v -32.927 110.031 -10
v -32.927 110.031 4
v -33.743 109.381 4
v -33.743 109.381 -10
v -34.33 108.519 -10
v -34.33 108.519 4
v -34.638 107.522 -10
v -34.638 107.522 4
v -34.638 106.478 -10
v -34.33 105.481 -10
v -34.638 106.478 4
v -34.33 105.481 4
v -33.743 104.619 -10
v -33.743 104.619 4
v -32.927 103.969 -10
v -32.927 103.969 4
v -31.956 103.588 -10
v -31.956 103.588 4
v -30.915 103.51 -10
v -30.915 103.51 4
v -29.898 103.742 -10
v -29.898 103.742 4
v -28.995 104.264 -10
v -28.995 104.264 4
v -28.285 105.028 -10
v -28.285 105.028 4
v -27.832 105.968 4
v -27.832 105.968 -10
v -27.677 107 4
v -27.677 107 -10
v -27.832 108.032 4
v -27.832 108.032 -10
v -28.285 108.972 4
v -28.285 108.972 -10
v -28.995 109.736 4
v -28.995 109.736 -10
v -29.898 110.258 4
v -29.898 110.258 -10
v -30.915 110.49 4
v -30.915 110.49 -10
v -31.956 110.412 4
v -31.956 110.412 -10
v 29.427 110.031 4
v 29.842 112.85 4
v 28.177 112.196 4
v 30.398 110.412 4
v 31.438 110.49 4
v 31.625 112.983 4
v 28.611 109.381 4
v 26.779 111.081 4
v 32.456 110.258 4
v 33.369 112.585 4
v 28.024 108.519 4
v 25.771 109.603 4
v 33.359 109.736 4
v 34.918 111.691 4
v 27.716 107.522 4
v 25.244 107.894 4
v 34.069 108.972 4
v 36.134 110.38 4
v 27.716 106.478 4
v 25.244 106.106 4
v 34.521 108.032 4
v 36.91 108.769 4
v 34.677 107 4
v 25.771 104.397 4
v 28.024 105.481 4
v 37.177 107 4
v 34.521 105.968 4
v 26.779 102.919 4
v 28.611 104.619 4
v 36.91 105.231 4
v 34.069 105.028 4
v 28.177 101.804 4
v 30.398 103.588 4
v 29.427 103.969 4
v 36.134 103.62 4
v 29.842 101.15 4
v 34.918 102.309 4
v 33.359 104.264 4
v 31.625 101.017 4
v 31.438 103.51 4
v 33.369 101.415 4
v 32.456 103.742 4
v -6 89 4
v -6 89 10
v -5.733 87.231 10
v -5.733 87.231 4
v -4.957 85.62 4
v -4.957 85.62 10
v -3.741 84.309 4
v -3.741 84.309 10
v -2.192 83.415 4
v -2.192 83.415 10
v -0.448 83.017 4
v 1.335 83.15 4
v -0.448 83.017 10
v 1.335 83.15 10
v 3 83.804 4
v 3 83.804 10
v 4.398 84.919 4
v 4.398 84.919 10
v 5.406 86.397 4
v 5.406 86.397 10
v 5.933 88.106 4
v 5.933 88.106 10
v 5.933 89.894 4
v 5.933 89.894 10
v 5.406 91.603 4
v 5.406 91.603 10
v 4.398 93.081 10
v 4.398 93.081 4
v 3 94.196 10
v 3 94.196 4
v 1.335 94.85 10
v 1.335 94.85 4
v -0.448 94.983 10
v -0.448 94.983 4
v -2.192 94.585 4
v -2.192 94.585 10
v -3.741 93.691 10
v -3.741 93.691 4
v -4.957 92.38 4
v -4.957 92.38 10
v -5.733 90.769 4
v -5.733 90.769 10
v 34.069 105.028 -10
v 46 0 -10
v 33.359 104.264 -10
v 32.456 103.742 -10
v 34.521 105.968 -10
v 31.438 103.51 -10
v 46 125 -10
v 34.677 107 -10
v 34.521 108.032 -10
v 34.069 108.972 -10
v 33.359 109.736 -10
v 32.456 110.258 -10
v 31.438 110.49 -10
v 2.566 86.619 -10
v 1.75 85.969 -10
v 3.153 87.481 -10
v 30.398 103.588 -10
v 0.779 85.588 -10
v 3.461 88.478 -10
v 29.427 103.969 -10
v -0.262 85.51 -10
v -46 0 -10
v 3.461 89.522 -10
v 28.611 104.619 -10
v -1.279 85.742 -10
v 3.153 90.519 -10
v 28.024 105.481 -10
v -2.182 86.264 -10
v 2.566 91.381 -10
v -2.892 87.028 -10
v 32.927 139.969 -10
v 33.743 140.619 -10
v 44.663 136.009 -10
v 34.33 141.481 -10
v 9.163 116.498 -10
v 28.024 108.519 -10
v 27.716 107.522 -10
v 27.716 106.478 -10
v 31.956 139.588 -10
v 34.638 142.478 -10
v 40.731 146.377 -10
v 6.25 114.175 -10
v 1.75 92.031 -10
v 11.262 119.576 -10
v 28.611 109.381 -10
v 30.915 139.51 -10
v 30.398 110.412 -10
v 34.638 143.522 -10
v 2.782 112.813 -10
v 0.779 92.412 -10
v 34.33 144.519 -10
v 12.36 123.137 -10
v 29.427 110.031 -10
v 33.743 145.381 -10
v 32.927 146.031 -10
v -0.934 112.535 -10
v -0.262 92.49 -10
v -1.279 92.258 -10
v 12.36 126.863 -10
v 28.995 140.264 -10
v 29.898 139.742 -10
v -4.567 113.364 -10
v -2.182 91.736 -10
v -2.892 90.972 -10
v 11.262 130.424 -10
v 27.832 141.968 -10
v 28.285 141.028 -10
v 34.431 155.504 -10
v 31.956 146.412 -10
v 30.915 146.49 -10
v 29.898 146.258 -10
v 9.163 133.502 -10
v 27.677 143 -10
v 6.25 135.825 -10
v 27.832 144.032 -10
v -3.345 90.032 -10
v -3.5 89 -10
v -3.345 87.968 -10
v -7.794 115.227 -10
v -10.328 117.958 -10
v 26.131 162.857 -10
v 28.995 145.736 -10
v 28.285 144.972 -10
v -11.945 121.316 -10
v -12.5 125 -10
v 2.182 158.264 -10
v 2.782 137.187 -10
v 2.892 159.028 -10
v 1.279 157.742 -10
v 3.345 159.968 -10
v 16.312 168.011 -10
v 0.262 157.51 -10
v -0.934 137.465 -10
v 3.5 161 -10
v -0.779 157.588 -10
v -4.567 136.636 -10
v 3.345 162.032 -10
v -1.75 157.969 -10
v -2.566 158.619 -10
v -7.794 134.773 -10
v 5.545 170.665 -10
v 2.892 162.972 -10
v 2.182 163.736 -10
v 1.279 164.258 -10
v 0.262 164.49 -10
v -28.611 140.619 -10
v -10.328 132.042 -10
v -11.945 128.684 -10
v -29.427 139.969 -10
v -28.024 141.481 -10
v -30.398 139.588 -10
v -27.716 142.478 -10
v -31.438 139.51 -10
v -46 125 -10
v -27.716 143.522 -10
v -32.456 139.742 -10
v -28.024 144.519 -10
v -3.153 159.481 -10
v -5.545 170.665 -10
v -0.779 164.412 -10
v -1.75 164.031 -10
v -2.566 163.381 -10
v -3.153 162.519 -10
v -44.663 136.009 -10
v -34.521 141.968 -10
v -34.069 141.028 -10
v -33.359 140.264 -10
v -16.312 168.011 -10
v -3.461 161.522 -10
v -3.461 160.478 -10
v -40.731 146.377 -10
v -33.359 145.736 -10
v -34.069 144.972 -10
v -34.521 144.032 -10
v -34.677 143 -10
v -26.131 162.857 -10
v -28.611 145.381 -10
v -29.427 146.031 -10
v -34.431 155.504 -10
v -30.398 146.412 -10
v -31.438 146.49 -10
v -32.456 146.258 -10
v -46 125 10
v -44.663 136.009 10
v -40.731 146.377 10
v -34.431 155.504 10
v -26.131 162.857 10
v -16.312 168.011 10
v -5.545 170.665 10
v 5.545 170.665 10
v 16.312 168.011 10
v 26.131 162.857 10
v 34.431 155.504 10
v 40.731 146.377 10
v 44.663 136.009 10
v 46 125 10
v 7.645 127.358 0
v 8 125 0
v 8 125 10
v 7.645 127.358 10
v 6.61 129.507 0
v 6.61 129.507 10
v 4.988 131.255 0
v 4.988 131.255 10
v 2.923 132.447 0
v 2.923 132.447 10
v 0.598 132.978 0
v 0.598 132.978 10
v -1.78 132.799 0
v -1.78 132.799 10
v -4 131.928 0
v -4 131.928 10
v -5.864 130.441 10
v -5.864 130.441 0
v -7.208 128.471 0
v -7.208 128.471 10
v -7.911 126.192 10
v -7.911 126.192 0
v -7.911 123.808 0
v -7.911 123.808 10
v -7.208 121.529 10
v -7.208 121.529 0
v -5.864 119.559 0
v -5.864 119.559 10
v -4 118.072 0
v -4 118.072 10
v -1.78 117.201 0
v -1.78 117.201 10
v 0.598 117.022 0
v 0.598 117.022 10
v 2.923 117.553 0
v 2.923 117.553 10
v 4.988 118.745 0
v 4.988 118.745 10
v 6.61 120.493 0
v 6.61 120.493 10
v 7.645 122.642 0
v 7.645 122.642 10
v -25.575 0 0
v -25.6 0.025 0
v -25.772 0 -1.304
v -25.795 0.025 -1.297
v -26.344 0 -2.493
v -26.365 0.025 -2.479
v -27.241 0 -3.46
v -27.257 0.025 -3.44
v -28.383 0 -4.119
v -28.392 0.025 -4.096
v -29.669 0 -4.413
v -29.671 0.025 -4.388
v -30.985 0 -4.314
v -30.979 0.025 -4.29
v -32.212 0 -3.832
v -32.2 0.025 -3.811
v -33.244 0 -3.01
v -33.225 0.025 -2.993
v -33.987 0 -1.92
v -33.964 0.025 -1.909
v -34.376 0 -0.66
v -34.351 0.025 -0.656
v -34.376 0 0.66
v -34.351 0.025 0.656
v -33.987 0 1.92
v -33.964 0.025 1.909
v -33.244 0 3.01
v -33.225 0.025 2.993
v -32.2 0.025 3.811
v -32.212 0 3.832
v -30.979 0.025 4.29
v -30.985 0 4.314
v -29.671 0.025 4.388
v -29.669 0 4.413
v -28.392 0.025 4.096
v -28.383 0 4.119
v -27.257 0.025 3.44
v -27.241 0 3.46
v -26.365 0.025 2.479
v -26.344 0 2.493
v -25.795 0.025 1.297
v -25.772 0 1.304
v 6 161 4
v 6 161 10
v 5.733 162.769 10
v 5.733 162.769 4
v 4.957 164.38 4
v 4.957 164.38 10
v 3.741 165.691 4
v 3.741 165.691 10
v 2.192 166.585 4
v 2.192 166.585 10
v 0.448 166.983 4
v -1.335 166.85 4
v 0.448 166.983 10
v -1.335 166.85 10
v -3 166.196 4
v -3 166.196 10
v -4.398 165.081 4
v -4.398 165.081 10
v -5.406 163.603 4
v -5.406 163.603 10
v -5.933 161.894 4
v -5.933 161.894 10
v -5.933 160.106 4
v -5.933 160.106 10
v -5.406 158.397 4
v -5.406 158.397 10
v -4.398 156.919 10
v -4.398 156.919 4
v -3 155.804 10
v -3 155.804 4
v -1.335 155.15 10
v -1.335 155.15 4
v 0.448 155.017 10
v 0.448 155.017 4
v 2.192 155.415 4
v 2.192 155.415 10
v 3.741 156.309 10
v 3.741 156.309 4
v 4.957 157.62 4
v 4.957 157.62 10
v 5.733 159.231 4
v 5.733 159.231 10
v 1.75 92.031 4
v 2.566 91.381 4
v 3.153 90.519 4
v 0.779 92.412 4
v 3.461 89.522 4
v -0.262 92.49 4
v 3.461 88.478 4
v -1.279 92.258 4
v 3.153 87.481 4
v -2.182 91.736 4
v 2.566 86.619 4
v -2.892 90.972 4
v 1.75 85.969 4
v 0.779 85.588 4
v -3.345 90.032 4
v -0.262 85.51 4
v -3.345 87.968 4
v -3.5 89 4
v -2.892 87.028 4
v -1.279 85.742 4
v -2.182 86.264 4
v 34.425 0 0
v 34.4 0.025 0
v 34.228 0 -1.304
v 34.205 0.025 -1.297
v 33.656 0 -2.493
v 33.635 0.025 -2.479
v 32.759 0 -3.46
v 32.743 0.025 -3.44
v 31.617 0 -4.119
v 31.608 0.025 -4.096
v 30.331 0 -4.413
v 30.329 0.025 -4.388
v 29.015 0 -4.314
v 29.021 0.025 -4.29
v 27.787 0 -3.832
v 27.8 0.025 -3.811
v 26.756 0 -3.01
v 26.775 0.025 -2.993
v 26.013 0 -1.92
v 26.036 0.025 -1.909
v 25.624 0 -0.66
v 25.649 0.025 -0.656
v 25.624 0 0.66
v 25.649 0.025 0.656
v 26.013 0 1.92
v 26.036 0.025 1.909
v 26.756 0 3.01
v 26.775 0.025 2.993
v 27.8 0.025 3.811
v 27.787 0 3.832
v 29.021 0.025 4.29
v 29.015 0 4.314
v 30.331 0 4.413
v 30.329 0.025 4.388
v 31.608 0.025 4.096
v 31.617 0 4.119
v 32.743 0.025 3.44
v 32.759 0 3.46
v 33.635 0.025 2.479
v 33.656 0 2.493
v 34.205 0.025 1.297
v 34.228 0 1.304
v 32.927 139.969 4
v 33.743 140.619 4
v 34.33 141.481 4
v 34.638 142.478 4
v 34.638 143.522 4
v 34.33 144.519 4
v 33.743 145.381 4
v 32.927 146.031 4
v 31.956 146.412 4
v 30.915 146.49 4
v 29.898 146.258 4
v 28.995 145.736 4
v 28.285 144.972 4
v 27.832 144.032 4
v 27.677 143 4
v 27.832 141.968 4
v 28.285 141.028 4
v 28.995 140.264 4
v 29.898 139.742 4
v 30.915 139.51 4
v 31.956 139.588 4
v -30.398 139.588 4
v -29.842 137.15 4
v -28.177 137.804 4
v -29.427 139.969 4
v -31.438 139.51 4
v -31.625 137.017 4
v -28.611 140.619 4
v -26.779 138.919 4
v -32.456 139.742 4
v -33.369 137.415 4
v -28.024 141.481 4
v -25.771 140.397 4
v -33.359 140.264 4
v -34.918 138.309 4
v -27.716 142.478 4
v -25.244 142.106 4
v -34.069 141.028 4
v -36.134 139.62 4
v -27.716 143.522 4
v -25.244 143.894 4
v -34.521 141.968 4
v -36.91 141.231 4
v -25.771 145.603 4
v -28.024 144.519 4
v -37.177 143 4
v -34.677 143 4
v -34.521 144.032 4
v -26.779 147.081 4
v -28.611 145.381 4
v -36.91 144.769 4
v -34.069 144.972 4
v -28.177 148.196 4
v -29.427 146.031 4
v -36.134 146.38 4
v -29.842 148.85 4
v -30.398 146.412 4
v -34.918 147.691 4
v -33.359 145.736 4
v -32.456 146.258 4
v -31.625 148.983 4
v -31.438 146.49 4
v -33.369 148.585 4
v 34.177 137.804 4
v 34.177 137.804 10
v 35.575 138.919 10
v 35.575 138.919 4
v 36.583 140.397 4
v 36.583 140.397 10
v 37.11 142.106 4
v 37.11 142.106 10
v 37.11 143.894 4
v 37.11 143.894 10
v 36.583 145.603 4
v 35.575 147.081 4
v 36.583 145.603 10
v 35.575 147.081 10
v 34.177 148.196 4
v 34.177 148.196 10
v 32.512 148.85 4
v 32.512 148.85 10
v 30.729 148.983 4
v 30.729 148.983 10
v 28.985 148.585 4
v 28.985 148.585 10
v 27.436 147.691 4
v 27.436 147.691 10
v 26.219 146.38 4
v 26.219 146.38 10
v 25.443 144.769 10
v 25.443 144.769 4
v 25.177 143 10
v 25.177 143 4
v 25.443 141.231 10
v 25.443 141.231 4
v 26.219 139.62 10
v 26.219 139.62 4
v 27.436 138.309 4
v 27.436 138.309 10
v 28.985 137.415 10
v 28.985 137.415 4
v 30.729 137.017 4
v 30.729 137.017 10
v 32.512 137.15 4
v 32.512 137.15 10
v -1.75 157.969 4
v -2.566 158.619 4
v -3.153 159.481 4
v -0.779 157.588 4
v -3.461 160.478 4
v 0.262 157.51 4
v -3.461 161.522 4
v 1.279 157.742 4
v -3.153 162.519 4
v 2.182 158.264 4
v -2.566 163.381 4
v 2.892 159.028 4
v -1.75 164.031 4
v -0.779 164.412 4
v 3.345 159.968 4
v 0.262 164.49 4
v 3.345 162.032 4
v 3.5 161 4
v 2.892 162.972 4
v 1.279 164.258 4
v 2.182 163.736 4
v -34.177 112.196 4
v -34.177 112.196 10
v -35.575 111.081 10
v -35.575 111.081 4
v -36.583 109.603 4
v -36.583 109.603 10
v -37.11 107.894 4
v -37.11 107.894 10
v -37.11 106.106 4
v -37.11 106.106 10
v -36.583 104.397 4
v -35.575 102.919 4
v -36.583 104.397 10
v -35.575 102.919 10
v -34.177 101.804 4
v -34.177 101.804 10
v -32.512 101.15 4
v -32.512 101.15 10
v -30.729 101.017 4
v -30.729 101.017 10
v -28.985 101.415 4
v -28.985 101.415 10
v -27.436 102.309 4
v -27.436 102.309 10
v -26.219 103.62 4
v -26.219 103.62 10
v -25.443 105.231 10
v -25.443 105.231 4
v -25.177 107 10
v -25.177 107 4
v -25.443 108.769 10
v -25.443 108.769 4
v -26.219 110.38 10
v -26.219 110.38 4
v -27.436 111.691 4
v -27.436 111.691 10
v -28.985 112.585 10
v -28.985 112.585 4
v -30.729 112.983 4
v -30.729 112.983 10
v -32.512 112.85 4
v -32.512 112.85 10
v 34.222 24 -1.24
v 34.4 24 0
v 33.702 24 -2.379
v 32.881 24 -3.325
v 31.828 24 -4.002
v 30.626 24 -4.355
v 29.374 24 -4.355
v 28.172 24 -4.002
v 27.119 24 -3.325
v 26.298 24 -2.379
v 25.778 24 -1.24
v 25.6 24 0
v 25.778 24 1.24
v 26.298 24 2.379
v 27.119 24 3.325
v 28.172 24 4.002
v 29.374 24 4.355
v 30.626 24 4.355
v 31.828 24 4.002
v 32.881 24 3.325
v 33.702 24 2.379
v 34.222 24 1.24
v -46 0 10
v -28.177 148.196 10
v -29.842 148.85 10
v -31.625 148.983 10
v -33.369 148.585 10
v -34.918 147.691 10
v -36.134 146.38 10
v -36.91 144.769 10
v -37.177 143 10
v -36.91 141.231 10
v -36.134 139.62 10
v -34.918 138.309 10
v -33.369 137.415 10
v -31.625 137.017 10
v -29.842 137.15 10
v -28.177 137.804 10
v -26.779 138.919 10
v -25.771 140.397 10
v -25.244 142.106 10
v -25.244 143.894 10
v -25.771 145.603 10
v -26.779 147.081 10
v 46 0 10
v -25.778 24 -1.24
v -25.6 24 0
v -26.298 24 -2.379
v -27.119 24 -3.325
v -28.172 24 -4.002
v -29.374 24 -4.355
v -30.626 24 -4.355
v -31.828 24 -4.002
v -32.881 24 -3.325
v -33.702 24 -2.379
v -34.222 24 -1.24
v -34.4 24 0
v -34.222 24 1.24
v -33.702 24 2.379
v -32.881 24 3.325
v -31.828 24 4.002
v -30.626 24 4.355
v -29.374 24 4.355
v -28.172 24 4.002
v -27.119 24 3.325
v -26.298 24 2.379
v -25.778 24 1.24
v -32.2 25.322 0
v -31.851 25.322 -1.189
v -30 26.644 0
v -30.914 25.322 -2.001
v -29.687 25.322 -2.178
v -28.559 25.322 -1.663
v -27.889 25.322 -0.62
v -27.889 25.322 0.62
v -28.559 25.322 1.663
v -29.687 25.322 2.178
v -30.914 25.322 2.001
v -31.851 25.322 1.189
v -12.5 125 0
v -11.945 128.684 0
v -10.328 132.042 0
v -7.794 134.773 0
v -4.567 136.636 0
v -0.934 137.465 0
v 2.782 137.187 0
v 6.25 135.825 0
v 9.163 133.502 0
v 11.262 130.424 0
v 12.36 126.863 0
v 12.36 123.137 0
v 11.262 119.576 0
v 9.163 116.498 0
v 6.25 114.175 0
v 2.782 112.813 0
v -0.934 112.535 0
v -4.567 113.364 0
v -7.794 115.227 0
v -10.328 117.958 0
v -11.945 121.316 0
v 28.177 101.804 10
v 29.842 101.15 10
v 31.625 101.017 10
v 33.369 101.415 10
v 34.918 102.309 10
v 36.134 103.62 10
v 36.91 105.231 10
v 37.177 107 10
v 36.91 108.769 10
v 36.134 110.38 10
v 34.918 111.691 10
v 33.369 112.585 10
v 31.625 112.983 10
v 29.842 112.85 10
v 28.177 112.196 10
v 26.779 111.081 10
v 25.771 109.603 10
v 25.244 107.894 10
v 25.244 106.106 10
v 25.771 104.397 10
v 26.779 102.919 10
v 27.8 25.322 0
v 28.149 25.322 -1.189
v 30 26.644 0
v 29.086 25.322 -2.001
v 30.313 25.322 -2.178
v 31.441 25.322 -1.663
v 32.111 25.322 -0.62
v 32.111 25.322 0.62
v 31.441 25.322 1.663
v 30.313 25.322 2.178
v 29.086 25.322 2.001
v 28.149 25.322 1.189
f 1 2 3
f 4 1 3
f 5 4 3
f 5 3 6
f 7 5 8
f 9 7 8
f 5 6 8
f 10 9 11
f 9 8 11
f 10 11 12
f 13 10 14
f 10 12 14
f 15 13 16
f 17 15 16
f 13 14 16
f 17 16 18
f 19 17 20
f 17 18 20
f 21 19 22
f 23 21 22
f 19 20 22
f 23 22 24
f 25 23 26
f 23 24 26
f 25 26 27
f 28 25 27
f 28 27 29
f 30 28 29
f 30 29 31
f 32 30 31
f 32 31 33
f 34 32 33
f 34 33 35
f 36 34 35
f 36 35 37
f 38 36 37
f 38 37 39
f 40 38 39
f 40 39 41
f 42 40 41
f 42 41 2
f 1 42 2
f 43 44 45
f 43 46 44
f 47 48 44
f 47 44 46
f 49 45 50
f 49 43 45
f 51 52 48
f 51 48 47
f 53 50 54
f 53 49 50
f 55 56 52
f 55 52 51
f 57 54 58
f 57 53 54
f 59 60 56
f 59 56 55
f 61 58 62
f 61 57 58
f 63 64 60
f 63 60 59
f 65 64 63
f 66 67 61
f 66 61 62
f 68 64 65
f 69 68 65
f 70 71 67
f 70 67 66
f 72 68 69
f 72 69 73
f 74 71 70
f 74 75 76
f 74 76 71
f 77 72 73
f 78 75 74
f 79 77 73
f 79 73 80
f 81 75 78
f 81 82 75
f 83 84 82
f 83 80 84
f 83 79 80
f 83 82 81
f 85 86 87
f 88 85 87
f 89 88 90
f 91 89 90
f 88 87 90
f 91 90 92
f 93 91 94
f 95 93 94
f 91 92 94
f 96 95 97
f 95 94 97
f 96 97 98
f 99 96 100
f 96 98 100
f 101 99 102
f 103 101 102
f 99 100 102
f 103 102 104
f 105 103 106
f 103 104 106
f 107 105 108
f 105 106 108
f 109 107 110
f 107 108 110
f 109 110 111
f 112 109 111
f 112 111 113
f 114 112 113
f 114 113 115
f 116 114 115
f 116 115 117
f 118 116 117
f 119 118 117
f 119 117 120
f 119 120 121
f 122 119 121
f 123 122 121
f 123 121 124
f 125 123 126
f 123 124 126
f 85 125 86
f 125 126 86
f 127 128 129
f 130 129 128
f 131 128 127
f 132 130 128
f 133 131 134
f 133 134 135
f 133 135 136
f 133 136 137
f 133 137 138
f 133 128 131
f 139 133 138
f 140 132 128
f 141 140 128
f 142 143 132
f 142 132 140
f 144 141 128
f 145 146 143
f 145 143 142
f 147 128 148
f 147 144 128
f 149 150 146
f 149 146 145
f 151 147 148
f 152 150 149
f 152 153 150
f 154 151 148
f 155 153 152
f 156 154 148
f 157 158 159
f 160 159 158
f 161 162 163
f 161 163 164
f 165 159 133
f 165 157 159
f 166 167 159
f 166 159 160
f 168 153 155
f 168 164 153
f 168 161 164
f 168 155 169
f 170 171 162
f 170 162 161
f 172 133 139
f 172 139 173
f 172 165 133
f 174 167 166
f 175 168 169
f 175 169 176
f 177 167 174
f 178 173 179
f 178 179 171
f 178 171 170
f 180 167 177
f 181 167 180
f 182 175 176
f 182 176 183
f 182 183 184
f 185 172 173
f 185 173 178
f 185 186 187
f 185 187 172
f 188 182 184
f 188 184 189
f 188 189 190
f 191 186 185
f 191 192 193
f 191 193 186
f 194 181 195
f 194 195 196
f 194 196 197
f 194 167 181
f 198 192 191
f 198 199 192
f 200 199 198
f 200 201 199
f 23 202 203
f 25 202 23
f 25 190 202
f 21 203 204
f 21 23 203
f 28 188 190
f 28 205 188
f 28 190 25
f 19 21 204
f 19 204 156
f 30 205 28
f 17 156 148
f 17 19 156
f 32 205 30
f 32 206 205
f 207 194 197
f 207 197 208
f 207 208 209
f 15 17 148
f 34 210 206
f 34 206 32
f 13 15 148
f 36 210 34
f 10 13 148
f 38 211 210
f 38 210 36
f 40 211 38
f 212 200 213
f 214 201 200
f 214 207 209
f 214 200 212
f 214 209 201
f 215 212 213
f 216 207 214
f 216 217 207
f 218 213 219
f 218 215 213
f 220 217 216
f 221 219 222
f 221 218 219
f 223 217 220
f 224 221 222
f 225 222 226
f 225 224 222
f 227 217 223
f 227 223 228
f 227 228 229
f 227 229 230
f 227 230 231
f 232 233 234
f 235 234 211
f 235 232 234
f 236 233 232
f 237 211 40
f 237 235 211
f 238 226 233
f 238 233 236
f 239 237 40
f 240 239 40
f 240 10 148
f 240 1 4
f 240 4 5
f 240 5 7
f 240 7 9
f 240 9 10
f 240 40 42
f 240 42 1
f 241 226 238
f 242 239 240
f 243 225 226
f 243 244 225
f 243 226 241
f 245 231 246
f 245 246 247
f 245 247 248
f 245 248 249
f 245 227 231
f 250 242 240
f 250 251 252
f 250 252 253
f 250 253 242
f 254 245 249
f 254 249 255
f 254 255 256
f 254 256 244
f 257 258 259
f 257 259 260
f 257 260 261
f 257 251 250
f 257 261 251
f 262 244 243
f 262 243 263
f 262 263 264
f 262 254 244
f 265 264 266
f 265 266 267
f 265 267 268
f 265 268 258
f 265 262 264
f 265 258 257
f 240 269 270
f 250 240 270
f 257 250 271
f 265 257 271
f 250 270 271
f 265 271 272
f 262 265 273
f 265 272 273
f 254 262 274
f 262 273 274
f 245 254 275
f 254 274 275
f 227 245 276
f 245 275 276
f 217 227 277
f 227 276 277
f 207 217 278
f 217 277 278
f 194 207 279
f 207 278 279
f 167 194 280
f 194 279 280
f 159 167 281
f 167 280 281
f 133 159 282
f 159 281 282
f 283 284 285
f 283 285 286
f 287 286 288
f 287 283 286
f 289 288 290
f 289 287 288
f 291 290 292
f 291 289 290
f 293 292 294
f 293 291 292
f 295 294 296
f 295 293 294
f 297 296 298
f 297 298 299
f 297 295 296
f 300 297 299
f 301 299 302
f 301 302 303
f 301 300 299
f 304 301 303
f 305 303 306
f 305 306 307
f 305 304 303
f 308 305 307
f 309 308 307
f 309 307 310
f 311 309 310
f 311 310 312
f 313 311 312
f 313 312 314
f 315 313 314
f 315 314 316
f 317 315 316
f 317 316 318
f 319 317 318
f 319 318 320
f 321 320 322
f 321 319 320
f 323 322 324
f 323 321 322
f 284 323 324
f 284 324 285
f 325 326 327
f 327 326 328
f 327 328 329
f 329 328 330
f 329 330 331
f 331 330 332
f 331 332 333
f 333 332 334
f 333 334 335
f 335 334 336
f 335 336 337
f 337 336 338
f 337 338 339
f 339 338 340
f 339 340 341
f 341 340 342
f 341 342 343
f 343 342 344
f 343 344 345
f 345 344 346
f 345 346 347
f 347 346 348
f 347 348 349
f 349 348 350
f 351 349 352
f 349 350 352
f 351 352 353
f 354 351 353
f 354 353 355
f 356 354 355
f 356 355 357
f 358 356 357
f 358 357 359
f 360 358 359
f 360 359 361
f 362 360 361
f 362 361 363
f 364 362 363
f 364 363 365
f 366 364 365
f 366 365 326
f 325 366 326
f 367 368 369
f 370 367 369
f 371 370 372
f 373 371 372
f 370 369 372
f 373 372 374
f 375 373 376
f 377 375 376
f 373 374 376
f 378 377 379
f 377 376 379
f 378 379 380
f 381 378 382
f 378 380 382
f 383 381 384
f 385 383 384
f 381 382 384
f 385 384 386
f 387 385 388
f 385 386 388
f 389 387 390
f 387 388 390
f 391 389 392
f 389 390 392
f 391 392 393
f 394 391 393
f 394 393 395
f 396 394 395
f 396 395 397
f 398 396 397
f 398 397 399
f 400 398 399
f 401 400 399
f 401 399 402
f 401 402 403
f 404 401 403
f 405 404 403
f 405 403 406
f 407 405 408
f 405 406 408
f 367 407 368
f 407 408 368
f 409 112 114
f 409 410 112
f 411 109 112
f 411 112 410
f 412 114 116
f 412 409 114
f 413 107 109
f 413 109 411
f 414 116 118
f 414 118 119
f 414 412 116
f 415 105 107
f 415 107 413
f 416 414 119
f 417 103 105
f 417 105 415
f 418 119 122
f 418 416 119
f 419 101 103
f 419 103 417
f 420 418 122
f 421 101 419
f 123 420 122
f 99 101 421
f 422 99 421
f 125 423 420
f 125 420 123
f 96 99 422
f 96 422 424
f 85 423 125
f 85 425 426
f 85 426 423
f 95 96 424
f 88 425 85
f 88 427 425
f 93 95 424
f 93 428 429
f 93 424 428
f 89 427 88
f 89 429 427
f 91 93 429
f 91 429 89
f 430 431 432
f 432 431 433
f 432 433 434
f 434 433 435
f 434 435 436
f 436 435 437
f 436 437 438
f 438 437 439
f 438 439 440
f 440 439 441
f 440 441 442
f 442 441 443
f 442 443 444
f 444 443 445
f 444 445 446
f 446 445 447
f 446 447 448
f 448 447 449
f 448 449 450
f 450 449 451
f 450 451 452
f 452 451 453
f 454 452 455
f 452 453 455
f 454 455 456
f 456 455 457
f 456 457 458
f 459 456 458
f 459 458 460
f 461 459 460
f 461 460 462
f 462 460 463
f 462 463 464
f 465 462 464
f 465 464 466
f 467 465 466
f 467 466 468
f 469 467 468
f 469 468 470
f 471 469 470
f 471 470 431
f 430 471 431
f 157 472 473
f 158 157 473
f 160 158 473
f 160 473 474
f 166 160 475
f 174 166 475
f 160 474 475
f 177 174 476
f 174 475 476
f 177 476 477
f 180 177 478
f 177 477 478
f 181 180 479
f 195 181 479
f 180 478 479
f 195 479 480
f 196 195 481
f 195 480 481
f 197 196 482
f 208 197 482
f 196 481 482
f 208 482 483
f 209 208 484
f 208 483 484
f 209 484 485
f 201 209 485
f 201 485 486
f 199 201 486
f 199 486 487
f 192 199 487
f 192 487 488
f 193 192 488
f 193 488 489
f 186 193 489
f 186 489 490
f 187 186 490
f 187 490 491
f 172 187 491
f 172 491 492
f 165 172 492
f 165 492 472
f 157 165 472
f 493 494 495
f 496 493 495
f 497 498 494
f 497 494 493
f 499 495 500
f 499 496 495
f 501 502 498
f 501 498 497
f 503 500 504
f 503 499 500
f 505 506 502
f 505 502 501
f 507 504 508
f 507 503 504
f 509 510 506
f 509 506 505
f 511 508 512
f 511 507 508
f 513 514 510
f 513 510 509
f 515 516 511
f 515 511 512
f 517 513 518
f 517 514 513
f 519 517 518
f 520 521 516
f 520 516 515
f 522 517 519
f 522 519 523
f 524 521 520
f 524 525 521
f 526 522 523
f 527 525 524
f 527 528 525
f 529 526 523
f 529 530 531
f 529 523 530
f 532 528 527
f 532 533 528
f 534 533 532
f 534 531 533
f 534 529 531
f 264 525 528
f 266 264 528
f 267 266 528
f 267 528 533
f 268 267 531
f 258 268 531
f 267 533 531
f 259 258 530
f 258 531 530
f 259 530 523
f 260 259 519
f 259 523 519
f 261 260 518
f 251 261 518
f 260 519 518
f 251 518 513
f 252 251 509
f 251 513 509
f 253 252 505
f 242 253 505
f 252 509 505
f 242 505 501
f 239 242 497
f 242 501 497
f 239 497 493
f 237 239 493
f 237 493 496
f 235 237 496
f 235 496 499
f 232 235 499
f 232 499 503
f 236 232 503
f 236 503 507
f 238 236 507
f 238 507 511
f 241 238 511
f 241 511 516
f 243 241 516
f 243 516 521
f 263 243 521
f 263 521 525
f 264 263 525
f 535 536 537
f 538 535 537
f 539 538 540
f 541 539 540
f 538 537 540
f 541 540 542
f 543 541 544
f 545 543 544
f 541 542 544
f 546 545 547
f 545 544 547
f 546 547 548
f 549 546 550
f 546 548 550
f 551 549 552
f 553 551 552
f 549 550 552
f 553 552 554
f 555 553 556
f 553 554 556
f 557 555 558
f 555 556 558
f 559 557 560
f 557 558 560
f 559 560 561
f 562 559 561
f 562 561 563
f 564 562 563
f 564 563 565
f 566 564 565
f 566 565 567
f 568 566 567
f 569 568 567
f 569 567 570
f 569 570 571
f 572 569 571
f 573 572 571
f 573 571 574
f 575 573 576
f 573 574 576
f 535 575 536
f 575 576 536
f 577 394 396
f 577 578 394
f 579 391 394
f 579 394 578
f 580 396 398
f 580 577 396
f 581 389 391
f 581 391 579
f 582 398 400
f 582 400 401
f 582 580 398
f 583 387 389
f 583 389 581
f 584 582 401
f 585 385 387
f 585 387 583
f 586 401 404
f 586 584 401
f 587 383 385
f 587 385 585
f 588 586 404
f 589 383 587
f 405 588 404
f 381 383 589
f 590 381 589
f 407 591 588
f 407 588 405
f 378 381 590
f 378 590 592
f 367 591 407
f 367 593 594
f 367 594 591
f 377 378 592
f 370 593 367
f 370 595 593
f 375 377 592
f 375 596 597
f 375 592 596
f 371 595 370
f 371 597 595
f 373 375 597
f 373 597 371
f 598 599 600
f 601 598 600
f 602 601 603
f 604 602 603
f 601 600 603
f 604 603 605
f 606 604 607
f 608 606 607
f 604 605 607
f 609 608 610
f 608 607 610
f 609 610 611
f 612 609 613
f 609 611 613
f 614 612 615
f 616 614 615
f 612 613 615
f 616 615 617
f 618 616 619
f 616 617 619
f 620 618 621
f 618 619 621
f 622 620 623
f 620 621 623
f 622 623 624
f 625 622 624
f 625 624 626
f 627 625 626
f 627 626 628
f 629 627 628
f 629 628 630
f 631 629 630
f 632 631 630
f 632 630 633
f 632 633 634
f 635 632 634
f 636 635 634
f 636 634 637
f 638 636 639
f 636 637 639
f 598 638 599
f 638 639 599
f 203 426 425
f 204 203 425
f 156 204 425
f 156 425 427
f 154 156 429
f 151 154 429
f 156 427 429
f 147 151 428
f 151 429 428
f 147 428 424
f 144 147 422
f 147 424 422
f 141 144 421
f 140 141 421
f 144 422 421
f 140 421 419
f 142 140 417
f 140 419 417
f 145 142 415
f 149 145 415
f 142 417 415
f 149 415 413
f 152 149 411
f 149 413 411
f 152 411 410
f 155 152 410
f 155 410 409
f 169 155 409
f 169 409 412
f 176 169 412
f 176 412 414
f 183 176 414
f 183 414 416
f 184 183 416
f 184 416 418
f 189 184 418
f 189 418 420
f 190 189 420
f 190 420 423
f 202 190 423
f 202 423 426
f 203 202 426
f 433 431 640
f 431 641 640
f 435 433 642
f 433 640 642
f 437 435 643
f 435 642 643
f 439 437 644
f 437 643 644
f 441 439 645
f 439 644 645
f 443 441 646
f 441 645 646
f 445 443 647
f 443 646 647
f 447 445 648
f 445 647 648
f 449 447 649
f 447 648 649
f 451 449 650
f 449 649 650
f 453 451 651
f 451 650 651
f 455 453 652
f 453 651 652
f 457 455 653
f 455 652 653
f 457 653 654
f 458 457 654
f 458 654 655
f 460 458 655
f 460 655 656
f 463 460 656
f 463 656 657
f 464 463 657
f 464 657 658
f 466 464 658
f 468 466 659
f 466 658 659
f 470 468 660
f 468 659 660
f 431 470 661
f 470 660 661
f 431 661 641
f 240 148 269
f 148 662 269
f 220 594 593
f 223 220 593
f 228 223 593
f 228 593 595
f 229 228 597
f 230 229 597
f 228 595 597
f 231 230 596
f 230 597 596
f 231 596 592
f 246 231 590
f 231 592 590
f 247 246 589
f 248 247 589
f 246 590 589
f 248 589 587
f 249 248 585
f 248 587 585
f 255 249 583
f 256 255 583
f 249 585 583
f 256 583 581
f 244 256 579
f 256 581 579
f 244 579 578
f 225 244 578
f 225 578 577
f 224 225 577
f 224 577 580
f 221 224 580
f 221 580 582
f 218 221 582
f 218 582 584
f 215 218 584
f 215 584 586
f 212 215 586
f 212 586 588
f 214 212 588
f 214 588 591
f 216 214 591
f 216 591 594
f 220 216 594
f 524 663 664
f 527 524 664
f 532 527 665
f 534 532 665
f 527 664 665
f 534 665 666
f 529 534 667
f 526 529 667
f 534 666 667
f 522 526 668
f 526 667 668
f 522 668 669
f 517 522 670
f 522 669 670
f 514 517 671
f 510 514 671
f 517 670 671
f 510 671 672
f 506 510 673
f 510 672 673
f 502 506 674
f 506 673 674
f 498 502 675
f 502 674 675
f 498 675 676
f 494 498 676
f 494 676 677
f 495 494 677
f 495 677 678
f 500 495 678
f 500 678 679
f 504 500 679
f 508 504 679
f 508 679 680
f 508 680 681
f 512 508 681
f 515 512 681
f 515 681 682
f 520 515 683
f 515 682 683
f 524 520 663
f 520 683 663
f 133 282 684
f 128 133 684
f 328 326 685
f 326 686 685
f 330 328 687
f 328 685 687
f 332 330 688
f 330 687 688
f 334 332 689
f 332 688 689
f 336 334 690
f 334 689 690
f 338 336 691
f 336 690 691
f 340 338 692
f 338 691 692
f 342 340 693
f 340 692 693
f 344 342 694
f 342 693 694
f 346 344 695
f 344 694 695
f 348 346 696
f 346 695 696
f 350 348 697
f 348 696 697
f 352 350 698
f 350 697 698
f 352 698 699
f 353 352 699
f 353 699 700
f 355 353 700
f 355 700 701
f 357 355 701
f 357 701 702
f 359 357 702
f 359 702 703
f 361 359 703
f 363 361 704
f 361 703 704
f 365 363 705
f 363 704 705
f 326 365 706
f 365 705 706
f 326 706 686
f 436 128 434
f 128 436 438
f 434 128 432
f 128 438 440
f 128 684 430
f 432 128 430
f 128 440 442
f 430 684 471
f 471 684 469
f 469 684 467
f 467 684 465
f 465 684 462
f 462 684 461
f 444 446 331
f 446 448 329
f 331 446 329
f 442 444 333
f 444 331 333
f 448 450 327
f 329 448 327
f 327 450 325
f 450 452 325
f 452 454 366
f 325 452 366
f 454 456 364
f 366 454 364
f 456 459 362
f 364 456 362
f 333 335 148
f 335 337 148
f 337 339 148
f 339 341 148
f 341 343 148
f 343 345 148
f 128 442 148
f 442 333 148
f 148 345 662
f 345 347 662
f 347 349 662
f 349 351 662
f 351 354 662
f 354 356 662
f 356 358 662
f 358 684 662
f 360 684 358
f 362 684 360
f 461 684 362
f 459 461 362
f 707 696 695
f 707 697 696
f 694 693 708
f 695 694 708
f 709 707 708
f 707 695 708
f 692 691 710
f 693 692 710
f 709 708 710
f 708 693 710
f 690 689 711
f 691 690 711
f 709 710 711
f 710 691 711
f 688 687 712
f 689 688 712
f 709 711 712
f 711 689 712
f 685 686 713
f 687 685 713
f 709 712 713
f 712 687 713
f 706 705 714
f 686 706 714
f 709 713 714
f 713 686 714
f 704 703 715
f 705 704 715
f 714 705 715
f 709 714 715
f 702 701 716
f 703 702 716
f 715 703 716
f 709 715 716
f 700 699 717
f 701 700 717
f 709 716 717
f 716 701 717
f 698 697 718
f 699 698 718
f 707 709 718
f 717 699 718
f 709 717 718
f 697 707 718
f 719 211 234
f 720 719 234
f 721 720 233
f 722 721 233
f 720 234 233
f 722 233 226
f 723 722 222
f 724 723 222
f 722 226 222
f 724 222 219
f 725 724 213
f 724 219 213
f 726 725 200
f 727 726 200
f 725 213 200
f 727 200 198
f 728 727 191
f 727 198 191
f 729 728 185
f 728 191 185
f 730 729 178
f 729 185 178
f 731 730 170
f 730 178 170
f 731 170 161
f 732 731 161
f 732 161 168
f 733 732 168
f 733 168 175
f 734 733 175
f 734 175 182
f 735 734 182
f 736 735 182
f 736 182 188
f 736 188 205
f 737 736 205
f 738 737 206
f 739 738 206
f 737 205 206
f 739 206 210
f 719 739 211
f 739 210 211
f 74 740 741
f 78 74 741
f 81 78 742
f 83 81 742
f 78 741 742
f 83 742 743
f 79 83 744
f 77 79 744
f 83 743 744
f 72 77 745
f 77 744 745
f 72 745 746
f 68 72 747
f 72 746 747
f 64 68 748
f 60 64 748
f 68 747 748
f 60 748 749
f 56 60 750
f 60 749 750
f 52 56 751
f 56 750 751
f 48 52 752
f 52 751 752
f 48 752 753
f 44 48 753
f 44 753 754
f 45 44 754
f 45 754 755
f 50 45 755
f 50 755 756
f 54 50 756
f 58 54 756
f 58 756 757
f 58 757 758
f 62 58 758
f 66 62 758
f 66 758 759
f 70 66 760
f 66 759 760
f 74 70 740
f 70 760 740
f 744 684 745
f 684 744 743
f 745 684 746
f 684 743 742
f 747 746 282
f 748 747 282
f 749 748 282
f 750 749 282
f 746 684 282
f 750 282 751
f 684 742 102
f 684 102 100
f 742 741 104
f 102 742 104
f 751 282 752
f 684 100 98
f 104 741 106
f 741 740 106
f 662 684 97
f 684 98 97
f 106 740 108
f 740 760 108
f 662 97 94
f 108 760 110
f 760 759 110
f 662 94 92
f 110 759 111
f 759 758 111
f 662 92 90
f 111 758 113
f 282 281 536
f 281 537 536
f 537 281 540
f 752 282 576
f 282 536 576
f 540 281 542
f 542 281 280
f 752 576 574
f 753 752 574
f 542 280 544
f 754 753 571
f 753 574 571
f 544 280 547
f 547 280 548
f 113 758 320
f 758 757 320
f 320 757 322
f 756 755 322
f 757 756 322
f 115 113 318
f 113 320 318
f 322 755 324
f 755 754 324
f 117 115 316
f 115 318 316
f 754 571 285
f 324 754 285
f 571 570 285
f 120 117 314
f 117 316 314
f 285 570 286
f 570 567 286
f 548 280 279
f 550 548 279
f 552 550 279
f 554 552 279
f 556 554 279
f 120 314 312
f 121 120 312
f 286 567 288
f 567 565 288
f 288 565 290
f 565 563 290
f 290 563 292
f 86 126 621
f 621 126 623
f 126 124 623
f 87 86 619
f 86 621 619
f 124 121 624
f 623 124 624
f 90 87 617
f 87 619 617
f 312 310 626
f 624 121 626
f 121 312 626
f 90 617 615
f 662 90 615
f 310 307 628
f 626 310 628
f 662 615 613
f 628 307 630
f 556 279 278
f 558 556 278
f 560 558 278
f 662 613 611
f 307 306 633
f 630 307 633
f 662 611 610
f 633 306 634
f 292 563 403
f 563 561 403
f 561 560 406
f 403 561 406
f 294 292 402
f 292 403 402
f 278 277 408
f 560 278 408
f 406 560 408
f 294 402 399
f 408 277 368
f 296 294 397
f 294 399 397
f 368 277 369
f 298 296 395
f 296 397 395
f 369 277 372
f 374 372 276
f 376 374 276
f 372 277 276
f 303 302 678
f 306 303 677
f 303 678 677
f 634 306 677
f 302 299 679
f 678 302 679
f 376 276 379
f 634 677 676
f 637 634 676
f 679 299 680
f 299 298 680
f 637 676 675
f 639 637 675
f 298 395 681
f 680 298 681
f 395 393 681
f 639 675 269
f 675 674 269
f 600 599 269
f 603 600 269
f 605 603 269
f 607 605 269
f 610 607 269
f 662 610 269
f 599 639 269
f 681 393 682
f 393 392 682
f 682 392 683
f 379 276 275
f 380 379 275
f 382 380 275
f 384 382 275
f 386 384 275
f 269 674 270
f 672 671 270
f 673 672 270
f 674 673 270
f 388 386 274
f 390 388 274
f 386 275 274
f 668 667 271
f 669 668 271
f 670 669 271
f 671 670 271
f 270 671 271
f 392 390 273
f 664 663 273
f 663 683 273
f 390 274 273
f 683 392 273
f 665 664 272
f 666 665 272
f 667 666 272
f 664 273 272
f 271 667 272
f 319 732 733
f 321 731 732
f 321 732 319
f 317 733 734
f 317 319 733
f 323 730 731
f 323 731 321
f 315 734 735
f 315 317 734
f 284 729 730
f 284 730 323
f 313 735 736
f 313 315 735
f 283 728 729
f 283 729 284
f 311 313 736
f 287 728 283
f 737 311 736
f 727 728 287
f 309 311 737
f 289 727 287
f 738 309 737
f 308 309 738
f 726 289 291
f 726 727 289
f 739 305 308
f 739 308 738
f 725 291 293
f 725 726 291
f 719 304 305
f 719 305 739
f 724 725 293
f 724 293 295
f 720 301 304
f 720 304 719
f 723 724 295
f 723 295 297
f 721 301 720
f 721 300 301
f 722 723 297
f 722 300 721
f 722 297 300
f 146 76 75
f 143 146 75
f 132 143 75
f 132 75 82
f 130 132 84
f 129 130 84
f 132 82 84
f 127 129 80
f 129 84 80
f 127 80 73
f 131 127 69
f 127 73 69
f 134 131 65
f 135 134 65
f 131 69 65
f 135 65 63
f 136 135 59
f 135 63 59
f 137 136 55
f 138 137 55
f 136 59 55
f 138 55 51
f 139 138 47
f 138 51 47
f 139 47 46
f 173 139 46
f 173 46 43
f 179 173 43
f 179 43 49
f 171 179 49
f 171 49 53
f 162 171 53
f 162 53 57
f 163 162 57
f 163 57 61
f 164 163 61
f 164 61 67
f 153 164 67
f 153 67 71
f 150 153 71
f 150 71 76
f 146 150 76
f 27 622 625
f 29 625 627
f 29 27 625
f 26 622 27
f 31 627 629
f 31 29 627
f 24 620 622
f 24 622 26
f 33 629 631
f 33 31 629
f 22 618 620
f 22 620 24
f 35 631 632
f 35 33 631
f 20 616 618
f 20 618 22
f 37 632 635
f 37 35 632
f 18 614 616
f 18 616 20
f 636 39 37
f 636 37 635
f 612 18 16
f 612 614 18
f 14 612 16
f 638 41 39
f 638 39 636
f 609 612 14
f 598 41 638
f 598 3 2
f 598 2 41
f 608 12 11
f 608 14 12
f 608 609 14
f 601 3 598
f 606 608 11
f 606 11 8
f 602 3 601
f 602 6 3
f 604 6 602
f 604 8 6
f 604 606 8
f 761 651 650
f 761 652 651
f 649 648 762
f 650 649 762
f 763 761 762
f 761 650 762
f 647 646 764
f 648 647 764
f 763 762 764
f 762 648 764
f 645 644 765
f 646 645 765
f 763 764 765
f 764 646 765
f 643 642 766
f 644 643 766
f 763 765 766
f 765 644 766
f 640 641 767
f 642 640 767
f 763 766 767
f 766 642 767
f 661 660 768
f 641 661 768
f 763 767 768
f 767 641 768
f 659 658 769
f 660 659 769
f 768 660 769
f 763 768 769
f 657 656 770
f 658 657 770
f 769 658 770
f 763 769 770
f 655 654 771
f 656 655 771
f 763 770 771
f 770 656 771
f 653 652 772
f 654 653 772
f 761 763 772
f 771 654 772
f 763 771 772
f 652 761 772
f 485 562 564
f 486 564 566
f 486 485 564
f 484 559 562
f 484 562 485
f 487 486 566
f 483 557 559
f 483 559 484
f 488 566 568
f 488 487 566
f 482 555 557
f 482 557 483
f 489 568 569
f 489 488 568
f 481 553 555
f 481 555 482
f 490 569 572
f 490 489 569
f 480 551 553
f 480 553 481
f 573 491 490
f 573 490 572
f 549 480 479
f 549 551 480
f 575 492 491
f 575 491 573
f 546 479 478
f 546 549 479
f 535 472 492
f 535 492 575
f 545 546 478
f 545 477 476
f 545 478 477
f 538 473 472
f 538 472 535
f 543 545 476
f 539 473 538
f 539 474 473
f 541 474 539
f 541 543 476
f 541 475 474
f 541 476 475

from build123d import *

# Parameters (mm, degrees)
SKETCH1_R                               = 8
BOSS_EXTRUDE1_DEPTH                     = 10
SKETCH3_R                               = 3.5
CUT_EXTRUDE2_DEPTH                      = 179.204938203
SKETCH4_R                               = 6
CUT_EXTRUDE3_DEPTH                      = 6
CIRPATTERN4_COUNT                       = 6
TAP_DRILL_FOR_M10X1_25_TAP1_D           = 8.8
TAP_DRILL_FOR_M10X1_25_TAP1_DEPTH       = 24
TAP_DRILL_FOR_M10X1_25_TAP1_CSINK_D     = 8.85
TAP_DRILL_FOR_M10X1_25_TAP1_CSINK_ANGLE = 90
TAP_DRILL_FOR_M10X1_25_TAP1_TIP         = 2.643786724
SKETCH10_R                              = 12.5
CUT_EXTRUDE4_DEPTH                      = 10


with BuildPart() as part:
    # Sketch1 → Boss-Extrude1 (new, symmetric)
    with BuildSketch(Plane.XY):
        with BuildLine():
            Line((46, 125), (46, 0))
            Line((46, 0), (-46, 0))
            Line((-46, 0), (-46, 125))
            ThreePointArc((-46, 125), (0, 171), (46, 125))
        make_face()
        with Locations((0, 125)):
            Circle(SKETCH1_R, mode=Mode.SUBTRACT)
    extrude(amount=BOSS_EXTRUDE1_DEPTH, both=True)

    # Sketch3 → Cut-Extrude2 (cut, through all)
    with BuildSketch(Plane.XY.offset(10)):
        with Locations((0, 161)):
            Circle(SKETCH3_R)
    cut_extrude2 = extrude(amount=-CUT_EXTRUDE2_DEPTH, mode=Mode.SUBTRACT)

    # Sketch4 → Cut-Extrude3 (cut)
    with BuildSketch(Plane.XY.offset(10)):
        with Locations((0, 161)):
            Circle(SKETCH4_R)
    cut_extrude3 = extrude(amount=-CUT_EXTRUDE3_DEPTH, mode=Mode.SUBTRACT)

    # CirPattern4: Cut-Extrude2, Cut-Extrude3 ×6 about axis
    cirpattern4_axis = Axis((0, 125, 0), (0, 0, 1))
    add([cut_extrude2.rotate(cirpattern4_axis, i * 360 / CIRPATTERN4_COUNT) for i in range(1, CIRPATTERN4_COUNT)], mode=Mode.SUBTRACT)
    add([cut_extrude3.rotate(cirpattern4_axis, i * 360 / CIRPATTERN4_COUNT) for i in range(1, CIRPATTERN4_COUNT)], mode=Mode.SUBTRACT)

    # Tap Drill for M10x1.25 Tap1
    with Locations(Plane(origin=(0, 0, 0), x_dir=(-1, 0, 0), z_dir=(0, -1, 0))):
        with Locations((-30, 0), (30, 0)):
            CounterSinkHole(TAP_DRILL_FOR_M10X1_25_TAP1_D / 2, TAP_DRILL_FOR_M10X1_25_TAP1_CSINK_D / 2, depth=TAP_DRILL_FOR_M10X1_25_TAP1_DEPTH, counter_sink_angle=TAP_DRILL_FOR_M10X1_25_TAP1_CSINK_ANGLE)
            with Locations((0, 0, -(TAP_DRILL_FOR_M10X1_25_TAP1_DEPTH + TAP_DRILL_FOR_M10X1_25_TAP1_TIP / 2))):  # 118° drill point
                Cone(0, TAP_DRILL_FOR_M10X1_25_TAP1_D / 2, TAP_DRILL_FOR_M10X1_25_TAP1_TIP, mode=Mode.SUBTRACT)

    # Sketch10 → Cut-Extrude4 (cut)
    with BuildSketch(Plane(origin=(0, 0, -10), x_dir=(-1, 0, 0), z_dir=(0, 0, -1))):
        with Locations((0, 125)):
            Circle(SKETCH10_R)
    extrude(amount=-CUT_EXTRUDE4_DEPTH, mode=Mode.SUBTRACT)


solid = part.part
